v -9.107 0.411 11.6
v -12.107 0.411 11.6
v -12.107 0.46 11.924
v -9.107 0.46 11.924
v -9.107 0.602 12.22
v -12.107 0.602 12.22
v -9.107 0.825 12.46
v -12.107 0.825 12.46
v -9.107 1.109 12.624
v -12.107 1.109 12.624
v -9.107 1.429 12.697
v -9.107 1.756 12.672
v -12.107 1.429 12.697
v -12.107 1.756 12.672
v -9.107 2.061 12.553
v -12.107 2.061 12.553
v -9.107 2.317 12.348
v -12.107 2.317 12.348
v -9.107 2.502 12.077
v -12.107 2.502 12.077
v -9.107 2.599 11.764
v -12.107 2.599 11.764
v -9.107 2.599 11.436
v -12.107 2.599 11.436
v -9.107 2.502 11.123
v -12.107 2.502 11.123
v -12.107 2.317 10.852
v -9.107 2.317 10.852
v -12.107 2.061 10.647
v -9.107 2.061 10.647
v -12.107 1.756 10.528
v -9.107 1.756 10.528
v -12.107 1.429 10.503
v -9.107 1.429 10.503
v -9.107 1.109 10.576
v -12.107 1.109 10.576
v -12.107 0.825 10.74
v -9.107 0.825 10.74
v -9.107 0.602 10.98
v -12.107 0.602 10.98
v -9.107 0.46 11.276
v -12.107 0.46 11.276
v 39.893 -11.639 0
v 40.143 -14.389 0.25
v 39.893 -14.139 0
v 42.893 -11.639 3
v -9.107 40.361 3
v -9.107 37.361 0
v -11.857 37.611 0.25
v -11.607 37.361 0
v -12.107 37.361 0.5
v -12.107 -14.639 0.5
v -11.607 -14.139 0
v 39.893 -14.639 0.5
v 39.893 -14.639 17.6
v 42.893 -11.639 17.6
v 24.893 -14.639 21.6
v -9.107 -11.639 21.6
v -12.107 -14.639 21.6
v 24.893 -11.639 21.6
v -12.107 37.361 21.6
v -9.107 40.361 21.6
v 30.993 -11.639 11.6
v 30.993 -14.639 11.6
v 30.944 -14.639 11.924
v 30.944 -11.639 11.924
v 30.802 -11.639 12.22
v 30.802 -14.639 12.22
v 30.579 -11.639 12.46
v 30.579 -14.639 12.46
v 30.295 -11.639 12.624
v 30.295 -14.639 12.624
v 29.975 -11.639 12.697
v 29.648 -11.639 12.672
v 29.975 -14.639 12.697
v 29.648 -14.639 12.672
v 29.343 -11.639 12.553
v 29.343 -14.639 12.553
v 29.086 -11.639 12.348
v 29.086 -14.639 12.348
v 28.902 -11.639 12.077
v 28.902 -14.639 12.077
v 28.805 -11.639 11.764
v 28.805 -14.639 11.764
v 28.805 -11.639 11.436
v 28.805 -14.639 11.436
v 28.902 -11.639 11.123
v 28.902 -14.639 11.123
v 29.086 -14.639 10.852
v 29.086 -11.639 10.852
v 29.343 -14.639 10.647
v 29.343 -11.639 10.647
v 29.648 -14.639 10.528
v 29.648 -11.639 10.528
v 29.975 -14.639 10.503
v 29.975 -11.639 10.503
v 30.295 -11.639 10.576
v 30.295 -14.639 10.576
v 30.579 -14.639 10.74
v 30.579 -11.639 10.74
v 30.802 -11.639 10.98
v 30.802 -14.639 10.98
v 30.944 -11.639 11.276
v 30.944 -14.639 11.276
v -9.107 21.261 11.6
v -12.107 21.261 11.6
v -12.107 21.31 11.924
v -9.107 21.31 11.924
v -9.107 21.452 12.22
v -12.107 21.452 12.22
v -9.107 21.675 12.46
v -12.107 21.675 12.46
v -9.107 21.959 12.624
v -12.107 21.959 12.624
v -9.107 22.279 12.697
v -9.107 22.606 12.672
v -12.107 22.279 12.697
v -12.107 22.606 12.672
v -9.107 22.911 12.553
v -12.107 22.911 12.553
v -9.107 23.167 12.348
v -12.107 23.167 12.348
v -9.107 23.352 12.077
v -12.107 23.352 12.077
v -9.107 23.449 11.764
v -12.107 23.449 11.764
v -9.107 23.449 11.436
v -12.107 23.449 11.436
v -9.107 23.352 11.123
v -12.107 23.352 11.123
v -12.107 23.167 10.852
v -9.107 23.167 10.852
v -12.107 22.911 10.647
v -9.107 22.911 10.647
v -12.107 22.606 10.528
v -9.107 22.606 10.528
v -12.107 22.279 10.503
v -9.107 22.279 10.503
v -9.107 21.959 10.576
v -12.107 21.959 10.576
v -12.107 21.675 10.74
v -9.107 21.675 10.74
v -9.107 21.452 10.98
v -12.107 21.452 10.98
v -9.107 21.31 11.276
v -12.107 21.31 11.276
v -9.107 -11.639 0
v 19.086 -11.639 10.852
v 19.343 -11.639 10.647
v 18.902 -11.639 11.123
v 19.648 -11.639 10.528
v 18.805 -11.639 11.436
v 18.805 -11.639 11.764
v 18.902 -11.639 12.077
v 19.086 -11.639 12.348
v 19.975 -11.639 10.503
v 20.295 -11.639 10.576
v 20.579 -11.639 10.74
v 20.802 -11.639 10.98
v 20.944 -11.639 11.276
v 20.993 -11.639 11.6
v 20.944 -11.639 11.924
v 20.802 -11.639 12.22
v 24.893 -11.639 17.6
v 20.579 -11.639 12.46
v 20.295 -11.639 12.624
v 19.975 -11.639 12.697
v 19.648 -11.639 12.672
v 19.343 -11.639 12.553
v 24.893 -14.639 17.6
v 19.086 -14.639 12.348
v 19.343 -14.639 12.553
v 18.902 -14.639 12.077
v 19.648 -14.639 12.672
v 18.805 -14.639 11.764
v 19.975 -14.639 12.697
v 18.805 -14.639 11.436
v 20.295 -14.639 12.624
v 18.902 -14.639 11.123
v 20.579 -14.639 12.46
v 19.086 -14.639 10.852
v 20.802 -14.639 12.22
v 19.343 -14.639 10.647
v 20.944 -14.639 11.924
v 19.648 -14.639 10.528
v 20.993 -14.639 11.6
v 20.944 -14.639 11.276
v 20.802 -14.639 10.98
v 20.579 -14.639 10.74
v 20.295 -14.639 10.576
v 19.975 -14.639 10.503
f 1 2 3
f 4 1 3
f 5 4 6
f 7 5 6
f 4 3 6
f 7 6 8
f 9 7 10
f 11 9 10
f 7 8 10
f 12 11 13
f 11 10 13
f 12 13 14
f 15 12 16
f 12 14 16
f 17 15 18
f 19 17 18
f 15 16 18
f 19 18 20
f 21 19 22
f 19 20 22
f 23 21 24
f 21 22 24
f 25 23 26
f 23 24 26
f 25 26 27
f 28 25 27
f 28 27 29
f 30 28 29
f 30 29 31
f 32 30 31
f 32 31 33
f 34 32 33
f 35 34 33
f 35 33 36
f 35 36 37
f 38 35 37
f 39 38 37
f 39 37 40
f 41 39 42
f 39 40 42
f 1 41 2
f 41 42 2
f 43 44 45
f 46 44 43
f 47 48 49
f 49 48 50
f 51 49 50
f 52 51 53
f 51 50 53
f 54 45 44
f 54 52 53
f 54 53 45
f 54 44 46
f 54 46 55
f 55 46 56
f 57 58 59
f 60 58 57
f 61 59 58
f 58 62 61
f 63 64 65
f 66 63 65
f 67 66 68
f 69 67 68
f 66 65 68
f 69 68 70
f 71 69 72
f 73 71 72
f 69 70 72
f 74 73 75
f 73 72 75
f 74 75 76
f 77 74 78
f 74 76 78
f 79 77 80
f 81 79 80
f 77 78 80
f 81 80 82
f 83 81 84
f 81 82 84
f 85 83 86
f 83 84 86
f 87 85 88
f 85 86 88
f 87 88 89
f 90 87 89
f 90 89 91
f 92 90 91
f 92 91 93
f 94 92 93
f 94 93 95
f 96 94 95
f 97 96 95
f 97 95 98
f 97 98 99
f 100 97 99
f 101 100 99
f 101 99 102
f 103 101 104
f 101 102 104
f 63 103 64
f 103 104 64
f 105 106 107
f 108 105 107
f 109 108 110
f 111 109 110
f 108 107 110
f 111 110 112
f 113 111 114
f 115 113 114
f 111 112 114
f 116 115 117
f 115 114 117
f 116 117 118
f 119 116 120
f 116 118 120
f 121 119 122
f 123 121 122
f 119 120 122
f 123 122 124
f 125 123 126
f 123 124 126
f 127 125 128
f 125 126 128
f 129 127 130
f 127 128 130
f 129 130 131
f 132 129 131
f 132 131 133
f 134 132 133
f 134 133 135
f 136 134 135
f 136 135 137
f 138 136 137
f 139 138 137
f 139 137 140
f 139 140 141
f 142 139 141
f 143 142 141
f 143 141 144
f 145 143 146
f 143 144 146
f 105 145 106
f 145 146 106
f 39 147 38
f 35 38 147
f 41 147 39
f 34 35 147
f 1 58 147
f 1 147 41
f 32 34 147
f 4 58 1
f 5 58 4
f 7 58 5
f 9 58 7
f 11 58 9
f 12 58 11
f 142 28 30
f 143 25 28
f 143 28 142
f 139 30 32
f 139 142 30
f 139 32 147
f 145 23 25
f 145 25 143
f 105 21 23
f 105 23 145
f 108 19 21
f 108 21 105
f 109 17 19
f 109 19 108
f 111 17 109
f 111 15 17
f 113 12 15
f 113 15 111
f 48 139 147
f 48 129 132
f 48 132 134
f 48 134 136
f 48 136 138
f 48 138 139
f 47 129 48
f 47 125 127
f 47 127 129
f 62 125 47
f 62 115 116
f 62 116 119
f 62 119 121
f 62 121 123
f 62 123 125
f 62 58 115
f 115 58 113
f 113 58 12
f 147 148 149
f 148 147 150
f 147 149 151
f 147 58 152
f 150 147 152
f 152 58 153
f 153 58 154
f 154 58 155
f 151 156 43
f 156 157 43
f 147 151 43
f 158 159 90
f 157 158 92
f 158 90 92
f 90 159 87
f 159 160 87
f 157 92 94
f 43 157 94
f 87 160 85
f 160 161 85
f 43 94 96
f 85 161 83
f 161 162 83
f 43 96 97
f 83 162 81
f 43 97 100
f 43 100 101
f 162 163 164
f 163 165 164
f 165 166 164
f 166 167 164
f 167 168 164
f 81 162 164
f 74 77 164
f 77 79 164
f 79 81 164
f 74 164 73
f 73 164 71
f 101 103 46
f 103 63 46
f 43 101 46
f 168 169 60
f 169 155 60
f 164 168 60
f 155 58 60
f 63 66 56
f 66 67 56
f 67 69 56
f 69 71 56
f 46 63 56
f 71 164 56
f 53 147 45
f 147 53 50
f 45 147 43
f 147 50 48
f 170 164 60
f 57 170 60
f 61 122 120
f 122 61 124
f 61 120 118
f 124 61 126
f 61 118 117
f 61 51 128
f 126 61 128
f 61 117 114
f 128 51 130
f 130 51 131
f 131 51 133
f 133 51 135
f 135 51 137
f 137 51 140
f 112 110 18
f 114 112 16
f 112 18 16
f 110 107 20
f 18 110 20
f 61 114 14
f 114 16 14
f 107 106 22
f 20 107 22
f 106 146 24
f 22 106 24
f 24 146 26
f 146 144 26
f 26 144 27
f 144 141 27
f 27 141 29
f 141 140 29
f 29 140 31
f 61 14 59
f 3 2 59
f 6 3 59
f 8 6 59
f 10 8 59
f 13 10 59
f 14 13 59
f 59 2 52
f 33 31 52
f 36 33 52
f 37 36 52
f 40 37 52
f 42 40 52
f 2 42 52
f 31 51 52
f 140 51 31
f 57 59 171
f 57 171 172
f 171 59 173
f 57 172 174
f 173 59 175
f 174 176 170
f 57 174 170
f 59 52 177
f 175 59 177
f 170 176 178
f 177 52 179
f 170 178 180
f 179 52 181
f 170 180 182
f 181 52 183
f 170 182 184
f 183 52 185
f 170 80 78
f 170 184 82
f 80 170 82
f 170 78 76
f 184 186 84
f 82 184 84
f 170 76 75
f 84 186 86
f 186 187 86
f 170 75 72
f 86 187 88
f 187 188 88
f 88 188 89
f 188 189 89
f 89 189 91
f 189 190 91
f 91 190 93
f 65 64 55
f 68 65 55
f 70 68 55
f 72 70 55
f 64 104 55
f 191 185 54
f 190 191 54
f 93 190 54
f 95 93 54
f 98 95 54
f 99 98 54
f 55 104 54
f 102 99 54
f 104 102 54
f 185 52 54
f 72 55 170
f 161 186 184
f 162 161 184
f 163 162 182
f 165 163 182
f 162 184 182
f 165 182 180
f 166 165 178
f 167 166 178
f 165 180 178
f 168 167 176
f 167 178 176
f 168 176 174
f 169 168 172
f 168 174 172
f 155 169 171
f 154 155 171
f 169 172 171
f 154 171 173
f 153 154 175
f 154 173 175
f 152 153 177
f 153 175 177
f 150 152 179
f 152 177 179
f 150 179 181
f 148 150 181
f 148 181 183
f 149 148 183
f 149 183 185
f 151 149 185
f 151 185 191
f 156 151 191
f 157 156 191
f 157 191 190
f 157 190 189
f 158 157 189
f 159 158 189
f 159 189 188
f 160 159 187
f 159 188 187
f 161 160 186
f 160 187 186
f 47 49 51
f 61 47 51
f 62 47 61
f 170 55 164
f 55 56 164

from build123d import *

# Parameters (mm, degrees)
F1_DEPTH  = 21.6
F2_W      = 52
F2_H      = 52
F3_DEPTH  = 22
F4_SIZE   = 2.99999
F5_SIZE   = 0.5
F6_R      = 1.1
F7_DEPTH  = 3
F8_R      = 1.1
F9_DEPTH  = 3
F10_W     = 18
F10_H     = 4
F11_DEPTH = 3


# Not quite as in the source:
# - a fillet or chamfer is up to 0.001 mm smaller than in the source, because OpenCascade refuses the exact size


with BuildPart() as f1:
    # F0 (on Top) → F1 (new body)
    with BuildSketch(Plane.XY):
        Polygon((-12.1071431786, 40.3610856729), (-12.1071431786, -14.6389143271), (42.8928568214, -14.6389143271), (42.8928568214, 7.8610856729), (10.3928568214, 40.3610856729), align=None)
    extrude(amount=F1_DEPTH)

    # F2 (on face) → F3 (cut)
    with BuildSketch(Plane.XY.offset(21.6)):
        with Locations((16.8928568214, 14.3610856729)):
            Rectangle(F2_W, F2_H)
    extrude(amount=-F3_DEPTH, mode=Mode.SUBTRACT)

    # F4 (size 3 in the source; OpenCascade refuses exactly that, so slightly less here)
    f4_edges = [f1.edges().sort_by_distance(p)[0] for p in [
        (42.892857, -13.138914, 0),
        (-10.607143, 40.361086, 0),
        (-12.107143, 40.361086, 10.8),
        (42.892857, -14.638914, 10.8),
    ]]
    chamfer(f4_edges, length=F4_SIZE)

    # F5
    f5_edges = [f1.edges().sort_by_distance(p)[0] for p in [
        (13.892862, -14.638914, 0),
        (-12.107143, 11.361091, 0),
    ]]
    chamfer(f5_edges, length=F5_SIZE)

    # F6 (on face) → F7 (cut)
    with BuildSketch(Plane.XZ.offset(14.6389143271)):
        with Locations((29.8928568214, 11.6)):
            Circle(F6_R)
        with Locations((19.8928568214, 11.6)):
            Circle(F6_R)
    extrude(amount=-F7_DEPTH, mode=Mode.SUBTRACT)

    # F8 (on face) → F9 (cut)
    with BuildSketch(Plane(origin=(-12.1071431786, 0, 0), x_dir=(0, -1, 0), z_dir=(-1, 0, 0))):
        with Locations((-22.3610856729, 11.6)):
            Circle(F8_R)
        with Locations((-1.5111208195, 11.6)):
            Circle(F8_R)
    extrude(amount=-F9_DEPTH, mode=Mode.SUBTRACT)

    # F10 (on face) → F11 (cut)
    with BuildSketch(Plane(origin=(0, -11.6389143271, 0), x_dir=(-1, 0, 0), z_dir=(0, 1, 0))):
        with Locations((-33.8928568214, 19.6)):
            Rectangle(F10_W, F10_H)
    extrude(amount=-F11_DEPTH, mode=Mode.SUBTRACT)


solid = f1.part
